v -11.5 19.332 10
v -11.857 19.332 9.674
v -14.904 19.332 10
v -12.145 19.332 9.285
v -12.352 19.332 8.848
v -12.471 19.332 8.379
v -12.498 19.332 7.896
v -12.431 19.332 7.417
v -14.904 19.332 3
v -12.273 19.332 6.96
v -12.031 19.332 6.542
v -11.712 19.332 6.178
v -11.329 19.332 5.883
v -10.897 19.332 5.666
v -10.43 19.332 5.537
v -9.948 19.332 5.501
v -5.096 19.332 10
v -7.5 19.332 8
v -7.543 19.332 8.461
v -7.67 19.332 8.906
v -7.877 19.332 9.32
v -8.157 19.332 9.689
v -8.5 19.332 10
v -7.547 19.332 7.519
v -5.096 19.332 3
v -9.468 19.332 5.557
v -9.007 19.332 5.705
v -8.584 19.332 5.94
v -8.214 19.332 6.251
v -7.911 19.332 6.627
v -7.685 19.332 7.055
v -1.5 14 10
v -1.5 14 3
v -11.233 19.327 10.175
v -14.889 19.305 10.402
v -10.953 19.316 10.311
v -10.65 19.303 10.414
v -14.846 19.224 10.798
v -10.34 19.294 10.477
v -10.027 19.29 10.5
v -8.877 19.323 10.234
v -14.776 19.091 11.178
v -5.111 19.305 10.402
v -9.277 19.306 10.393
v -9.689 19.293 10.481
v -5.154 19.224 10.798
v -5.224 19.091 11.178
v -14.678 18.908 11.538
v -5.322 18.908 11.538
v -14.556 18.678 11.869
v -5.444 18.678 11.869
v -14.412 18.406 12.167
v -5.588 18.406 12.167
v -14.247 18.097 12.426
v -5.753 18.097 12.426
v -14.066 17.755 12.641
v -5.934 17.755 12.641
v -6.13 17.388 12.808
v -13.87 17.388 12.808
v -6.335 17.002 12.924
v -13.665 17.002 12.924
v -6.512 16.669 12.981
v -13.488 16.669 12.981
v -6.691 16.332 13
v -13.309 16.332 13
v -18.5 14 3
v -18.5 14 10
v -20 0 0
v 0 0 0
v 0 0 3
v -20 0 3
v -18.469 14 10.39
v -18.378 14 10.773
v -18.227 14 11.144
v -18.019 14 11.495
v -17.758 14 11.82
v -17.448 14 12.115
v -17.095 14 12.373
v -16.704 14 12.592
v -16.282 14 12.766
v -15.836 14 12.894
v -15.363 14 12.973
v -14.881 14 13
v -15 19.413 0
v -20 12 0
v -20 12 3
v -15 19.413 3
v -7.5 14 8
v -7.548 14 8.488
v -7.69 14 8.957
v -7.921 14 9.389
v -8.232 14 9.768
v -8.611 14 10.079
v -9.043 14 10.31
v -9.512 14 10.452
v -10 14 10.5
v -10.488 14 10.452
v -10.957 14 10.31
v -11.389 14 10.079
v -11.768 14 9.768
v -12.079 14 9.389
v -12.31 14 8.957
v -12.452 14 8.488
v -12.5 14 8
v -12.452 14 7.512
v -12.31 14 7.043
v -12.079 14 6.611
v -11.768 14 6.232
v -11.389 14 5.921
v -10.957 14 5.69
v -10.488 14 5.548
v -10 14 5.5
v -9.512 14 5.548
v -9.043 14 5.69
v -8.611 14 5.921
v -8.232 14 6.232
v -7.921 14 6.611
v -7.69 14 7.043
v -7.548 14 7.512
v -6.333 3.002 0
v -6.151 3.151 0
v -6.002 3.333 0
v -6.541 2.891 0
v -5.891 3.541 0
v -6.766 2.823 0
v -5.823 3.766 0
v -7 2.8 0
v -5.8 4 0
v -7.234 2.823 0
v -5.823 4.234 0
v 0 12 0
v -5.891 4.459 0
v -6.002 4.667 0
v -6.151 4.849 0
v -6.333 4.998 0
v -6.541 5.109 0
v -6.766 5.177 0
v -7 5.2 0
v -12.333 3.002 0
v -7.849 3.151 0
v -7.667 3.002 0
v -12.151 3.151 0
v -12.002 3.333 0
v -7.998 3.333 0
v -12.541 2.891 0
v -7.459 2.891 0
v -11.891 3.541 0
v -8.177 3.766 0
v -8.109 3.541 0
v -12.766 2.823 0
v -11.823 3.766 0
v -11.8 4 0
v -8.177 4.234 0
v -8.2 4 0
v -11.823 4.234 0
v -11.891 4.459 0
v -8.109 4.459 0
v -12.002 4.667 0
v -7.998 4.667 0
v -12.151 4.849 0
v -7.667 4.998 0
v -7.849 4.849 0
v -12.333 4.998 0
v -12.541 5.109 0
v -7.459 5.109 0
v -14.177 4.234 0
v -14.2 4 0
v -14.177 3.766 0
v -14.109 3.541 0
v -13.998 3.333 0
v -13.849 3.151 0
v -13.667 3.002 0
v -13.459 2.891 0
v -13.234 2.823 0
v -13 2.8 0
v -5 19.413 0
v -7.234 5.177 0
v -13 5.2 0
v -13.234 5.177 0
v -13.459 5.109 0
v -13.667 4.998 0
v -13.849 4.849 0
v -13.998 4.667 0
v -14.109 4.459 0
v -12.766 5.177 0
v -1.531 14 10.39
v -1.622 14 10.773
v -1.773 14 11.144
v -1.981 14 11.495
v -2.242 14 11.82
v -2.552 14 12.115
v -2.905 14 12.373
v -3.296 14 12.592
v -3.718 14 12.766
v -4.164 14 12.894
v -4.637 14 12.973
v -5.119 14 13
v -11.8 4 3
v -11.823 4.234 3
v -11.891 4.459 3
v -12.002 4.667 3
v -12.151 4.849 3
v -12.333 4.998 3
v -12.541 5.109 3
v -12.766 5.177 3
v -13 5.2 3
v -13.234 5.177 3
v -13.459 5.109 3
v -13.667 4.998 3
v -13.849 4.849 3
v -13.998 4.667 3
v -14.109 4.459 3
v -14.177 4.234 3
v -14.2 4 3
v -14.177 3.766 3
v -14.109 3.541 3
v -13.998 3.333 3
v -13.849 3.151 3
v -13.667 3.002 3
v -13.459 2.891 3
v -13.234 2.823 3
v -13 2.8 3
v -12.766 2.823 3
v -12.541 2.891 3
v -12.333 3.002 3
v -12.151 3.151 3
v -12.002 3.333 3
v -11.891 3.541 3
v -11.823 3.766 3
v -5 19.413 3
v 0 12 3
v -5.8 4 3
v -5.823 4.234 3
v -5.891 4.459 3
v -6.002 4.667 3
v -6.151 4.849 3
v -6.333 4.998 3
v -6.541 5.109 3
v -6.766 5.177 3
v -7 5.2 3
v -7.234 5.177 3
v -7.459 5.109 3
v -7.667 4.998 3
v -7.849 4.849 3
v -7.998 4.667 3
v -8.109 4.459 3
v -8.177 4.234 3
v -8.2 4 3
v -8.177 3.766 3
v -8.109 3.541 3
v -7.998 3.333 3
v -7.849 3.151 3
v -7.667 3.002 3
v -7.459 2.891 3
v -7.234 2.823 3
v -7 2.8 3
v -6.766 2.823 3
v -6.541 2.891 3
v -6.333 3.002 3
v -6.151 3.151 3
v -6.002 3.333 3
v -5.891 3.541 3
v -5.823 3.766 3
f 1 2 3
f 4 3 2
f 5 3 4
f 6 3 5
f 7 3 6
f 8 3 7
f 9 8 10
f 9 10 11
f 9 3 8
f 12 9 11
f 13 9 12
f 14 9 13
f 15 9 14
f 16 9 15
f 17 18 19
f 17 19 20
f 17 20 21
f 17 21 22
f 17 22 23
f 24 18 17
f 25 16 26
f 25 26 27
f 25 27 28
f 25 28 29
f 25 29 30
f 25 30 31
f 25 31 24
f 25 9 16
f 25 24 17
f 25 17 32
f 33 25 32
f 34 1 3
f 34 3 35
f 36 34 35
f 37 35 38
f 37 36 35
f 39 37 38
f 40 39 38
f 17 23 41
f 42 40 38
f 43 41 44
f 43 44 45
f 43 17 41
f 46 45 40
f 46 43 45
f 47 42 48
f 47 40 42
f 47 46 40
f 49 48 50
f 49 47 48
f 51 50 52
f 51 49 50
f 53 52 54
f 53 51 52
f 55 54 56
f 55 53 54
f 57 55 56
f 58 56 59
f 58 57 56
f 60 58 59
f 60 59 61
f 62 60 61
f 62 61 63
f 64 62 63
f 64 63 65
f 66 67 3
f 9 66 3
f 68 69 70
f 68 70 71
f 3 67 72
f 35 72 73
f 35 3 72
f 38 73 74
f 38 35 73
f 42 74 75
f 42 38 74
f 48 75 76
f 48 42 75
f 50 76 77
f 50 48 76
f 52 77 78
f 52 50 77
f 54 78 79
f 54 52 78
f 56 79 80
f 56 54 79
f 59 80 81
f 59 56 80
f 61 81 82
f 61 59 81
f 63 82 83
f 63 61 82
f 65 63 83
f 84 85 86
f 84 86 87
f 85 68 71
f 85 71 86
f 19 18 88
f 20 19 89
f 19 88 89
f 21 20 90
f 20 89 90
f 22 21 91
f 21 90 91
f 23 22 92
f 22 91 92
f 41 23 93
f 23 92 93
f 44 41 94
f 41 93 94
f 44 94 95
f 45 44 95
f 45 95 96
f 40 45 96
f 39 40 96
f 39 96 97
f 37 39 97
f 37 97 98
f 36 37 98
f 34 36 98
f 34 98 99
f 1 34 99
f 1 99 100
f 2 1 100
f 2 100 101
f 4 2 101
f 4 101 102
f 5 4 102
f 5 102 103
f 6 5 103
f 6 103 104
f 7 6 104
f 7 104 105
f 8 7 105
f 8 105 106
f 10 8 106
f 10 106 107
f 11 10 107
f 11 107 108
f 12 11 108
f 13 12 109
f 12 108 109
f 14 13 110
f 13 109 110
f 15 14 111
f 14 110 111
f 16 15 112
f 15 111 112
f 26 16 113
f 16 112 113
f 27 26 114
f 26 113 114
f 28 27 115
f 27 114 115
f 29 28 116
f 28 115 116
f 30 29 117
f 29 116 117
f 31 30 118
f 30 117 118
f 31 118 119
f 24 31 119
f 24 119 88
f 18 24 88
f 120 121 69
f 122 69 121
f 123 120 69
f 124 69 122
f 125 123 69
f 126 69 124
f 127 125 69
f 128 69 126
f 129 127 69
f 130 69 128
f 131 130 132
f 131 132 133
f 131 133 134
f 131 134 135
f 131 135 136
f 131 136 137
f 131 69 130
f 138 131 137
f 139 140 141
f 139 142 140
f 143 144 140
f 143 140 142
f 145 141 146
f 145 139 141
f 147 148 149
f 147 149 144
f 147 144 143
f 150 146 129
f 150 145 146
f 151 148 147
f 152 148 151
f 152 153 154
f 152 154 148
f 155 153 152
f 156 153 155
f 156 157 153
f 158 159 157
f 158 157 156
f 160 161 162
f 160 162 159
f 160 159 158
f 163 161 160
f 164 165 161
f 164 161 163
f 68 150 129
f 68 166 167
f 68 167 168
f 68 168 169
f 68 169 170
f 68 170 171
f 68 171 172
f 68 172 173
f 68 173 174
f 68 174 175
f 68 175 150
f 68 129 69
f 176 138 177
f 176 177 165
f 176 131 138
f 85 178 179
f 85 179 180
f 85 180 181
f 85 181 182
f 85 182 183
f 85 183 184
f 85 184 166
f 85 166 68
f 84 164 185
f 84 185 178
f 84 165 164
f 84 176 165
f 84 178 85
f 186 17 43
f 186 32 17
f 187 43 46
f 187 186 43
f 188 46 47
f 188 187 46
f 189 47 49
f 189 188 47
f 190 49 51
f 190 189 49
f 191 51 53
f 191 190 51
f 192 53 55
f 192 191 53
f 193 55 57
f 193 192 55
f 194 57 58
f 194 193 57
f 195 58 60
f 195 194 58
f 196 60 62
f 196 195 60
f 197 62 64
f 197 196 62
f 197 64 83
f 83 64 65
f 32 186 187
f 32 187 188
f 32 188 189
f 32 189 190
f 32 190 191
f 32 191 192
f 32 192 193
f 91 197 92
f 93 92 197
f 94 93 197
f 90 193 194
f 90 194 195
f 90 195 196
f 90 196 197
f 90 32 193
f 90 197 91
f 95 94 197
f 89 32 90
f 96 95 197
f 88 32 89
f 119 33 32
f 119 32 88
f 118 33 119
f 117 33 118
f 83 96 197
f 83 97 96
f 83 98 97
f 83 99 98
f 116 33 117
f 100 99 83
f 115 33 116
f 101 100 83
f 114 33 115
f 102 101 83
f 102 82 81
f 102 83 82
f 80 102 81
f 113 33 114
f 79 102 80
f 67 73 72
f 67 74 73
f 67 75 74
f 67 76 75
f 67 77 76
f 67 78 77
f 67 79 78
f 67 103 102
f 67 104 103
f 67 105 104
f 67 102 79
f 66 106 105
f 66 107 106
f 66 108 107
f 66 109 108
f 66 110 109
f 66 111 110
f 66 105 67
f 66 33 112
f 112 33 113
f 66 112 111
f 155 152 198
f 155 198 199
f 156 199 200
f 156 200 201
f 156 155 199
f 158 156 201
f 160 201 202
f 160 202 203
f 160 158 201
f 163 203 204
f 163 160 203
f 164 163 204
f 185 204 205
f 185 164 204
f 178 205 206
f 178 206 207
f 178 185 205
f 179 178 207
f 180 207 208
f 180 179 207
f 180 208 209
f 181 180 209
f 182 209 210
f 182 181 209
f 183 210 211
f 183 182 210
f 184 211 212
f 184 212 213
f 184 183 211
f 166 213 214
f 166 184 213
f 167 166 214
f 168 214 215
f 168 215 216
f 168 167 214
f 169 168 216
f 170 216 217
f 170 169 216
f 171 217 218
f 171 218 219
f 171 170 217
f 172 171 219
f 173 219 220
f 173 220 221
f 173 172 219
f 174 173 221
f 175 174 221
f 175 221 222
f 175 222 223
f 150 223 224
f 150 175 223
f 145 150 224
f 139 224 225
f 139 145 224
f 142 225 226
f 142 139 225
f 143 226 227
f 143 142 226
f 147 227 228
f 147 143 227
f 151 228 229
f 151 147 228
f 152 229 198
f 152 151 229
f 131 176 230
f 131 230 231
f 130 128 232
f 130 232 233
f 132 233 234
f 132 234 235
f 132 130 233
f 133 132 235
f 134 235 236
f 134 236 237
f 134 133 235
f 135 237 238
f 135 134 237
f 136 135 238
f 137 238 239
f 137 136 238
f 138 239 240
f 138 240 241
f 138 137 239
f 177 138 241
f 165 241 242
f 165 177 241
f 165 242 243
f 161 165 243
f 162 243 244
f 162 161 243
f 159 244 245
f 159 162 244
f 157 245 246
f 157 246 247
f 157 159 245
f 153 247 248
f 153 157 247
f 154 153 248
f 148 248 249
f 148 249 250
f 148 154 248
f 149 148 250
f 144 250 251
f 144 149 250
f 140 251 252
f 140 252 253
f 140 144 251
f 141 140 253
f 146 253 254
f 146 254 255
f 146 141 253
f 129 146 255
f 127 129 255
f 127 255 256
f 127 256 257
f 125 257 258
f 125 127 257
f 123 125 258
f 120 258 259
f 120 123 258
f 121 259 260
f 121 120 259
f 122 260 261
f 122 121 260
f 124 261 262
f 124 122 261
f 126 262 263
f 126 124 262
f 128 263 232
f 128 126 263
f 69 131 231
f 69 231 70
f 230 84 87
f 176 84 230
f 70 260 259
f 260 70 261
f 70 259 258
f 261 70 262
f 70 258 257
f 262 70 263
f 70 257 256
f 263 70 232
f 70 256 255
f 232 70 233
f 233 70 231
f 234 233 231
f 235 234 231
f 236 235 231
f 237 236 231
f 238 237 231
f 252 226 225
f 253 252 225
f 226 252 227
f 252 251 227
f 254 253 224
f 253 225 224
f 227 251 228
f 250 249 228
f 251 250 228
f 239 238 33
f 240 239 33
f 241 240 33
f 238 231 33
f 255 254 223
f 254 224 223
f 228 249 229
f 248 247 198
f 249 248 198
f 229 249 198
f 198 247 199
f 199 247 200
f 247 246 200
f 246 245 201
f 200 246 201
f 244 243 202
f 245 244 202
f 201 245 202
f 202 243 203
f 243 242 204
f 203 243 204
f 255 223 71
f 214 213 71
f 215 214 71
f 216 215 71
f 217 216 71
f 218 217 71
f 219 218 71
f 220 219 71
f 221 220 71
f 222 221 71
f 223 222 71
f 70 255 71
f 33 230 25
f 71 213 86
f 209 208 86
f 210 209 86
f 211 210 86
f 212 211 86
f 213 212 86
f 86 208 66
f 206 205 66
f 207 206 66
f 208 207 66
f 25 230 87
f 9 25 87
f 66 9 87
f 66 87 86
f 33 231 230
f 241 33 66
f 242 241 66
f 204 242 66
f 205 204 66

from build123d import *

# Parameters (mm, degrees)
SKETCH_R     = 1.2
PAD_DEPTH    = 3
PAD001_DEPTH = 10
FILLET_R     = 3
SKETCH002_R  = 2.5
POCKET_DEPTH = 6


with BuildPart() as part:
    # Sketch → Pad (new body)
    with BuildSketch(Plane.XY):
        Polygon((0, 12), (0, 0), (-20, 0), (-20, 12), (-15, 19.412805), (-5, 19.412805), align=None)
        with Locations((-13, 4)):
            Circle(SKETCH_R, mode=Mode.SUBTRACT)
        with Locations((-7, 4)):
            Circle(SKETCH_R, mode=Mode.SUBTRACT)
    extrude(amount=PAD_DEPTH)

    # Sketch001 (on Face10 of Pad) → Pad001 (join)
    with BuildSketch(Plane.XY.offset(3)):
        Polygon((-14.90374, 19.331674), (-5.09626, 19.331674), (-1.5, 14), (-18.5, 14), align=None)
    extrude(amount=PAD001_DEPTH)

    # Fillet
    fillet_edges = [part.edges().sort_by_distance(p)[0] for p in [
        (-3.29813, 16.665837, 13),
        (-10, 19.331674, 13),
        (-16.70187, 16.665837, 13),
    ]]
    fillet(fillet_edges, radius=FILLET_R)

    # Sketch002 (on Face12 of Pad001) → Pocket (cut)
    with BuildSketch(Plane.XZ.offset(-14)):
        with Locations((-10, 8)):
            Circle(SKETCH002_R)
    extrude(amount=-POCKET_DEPTH, mode=Mode.SUBTRACT)


solid = part.part
